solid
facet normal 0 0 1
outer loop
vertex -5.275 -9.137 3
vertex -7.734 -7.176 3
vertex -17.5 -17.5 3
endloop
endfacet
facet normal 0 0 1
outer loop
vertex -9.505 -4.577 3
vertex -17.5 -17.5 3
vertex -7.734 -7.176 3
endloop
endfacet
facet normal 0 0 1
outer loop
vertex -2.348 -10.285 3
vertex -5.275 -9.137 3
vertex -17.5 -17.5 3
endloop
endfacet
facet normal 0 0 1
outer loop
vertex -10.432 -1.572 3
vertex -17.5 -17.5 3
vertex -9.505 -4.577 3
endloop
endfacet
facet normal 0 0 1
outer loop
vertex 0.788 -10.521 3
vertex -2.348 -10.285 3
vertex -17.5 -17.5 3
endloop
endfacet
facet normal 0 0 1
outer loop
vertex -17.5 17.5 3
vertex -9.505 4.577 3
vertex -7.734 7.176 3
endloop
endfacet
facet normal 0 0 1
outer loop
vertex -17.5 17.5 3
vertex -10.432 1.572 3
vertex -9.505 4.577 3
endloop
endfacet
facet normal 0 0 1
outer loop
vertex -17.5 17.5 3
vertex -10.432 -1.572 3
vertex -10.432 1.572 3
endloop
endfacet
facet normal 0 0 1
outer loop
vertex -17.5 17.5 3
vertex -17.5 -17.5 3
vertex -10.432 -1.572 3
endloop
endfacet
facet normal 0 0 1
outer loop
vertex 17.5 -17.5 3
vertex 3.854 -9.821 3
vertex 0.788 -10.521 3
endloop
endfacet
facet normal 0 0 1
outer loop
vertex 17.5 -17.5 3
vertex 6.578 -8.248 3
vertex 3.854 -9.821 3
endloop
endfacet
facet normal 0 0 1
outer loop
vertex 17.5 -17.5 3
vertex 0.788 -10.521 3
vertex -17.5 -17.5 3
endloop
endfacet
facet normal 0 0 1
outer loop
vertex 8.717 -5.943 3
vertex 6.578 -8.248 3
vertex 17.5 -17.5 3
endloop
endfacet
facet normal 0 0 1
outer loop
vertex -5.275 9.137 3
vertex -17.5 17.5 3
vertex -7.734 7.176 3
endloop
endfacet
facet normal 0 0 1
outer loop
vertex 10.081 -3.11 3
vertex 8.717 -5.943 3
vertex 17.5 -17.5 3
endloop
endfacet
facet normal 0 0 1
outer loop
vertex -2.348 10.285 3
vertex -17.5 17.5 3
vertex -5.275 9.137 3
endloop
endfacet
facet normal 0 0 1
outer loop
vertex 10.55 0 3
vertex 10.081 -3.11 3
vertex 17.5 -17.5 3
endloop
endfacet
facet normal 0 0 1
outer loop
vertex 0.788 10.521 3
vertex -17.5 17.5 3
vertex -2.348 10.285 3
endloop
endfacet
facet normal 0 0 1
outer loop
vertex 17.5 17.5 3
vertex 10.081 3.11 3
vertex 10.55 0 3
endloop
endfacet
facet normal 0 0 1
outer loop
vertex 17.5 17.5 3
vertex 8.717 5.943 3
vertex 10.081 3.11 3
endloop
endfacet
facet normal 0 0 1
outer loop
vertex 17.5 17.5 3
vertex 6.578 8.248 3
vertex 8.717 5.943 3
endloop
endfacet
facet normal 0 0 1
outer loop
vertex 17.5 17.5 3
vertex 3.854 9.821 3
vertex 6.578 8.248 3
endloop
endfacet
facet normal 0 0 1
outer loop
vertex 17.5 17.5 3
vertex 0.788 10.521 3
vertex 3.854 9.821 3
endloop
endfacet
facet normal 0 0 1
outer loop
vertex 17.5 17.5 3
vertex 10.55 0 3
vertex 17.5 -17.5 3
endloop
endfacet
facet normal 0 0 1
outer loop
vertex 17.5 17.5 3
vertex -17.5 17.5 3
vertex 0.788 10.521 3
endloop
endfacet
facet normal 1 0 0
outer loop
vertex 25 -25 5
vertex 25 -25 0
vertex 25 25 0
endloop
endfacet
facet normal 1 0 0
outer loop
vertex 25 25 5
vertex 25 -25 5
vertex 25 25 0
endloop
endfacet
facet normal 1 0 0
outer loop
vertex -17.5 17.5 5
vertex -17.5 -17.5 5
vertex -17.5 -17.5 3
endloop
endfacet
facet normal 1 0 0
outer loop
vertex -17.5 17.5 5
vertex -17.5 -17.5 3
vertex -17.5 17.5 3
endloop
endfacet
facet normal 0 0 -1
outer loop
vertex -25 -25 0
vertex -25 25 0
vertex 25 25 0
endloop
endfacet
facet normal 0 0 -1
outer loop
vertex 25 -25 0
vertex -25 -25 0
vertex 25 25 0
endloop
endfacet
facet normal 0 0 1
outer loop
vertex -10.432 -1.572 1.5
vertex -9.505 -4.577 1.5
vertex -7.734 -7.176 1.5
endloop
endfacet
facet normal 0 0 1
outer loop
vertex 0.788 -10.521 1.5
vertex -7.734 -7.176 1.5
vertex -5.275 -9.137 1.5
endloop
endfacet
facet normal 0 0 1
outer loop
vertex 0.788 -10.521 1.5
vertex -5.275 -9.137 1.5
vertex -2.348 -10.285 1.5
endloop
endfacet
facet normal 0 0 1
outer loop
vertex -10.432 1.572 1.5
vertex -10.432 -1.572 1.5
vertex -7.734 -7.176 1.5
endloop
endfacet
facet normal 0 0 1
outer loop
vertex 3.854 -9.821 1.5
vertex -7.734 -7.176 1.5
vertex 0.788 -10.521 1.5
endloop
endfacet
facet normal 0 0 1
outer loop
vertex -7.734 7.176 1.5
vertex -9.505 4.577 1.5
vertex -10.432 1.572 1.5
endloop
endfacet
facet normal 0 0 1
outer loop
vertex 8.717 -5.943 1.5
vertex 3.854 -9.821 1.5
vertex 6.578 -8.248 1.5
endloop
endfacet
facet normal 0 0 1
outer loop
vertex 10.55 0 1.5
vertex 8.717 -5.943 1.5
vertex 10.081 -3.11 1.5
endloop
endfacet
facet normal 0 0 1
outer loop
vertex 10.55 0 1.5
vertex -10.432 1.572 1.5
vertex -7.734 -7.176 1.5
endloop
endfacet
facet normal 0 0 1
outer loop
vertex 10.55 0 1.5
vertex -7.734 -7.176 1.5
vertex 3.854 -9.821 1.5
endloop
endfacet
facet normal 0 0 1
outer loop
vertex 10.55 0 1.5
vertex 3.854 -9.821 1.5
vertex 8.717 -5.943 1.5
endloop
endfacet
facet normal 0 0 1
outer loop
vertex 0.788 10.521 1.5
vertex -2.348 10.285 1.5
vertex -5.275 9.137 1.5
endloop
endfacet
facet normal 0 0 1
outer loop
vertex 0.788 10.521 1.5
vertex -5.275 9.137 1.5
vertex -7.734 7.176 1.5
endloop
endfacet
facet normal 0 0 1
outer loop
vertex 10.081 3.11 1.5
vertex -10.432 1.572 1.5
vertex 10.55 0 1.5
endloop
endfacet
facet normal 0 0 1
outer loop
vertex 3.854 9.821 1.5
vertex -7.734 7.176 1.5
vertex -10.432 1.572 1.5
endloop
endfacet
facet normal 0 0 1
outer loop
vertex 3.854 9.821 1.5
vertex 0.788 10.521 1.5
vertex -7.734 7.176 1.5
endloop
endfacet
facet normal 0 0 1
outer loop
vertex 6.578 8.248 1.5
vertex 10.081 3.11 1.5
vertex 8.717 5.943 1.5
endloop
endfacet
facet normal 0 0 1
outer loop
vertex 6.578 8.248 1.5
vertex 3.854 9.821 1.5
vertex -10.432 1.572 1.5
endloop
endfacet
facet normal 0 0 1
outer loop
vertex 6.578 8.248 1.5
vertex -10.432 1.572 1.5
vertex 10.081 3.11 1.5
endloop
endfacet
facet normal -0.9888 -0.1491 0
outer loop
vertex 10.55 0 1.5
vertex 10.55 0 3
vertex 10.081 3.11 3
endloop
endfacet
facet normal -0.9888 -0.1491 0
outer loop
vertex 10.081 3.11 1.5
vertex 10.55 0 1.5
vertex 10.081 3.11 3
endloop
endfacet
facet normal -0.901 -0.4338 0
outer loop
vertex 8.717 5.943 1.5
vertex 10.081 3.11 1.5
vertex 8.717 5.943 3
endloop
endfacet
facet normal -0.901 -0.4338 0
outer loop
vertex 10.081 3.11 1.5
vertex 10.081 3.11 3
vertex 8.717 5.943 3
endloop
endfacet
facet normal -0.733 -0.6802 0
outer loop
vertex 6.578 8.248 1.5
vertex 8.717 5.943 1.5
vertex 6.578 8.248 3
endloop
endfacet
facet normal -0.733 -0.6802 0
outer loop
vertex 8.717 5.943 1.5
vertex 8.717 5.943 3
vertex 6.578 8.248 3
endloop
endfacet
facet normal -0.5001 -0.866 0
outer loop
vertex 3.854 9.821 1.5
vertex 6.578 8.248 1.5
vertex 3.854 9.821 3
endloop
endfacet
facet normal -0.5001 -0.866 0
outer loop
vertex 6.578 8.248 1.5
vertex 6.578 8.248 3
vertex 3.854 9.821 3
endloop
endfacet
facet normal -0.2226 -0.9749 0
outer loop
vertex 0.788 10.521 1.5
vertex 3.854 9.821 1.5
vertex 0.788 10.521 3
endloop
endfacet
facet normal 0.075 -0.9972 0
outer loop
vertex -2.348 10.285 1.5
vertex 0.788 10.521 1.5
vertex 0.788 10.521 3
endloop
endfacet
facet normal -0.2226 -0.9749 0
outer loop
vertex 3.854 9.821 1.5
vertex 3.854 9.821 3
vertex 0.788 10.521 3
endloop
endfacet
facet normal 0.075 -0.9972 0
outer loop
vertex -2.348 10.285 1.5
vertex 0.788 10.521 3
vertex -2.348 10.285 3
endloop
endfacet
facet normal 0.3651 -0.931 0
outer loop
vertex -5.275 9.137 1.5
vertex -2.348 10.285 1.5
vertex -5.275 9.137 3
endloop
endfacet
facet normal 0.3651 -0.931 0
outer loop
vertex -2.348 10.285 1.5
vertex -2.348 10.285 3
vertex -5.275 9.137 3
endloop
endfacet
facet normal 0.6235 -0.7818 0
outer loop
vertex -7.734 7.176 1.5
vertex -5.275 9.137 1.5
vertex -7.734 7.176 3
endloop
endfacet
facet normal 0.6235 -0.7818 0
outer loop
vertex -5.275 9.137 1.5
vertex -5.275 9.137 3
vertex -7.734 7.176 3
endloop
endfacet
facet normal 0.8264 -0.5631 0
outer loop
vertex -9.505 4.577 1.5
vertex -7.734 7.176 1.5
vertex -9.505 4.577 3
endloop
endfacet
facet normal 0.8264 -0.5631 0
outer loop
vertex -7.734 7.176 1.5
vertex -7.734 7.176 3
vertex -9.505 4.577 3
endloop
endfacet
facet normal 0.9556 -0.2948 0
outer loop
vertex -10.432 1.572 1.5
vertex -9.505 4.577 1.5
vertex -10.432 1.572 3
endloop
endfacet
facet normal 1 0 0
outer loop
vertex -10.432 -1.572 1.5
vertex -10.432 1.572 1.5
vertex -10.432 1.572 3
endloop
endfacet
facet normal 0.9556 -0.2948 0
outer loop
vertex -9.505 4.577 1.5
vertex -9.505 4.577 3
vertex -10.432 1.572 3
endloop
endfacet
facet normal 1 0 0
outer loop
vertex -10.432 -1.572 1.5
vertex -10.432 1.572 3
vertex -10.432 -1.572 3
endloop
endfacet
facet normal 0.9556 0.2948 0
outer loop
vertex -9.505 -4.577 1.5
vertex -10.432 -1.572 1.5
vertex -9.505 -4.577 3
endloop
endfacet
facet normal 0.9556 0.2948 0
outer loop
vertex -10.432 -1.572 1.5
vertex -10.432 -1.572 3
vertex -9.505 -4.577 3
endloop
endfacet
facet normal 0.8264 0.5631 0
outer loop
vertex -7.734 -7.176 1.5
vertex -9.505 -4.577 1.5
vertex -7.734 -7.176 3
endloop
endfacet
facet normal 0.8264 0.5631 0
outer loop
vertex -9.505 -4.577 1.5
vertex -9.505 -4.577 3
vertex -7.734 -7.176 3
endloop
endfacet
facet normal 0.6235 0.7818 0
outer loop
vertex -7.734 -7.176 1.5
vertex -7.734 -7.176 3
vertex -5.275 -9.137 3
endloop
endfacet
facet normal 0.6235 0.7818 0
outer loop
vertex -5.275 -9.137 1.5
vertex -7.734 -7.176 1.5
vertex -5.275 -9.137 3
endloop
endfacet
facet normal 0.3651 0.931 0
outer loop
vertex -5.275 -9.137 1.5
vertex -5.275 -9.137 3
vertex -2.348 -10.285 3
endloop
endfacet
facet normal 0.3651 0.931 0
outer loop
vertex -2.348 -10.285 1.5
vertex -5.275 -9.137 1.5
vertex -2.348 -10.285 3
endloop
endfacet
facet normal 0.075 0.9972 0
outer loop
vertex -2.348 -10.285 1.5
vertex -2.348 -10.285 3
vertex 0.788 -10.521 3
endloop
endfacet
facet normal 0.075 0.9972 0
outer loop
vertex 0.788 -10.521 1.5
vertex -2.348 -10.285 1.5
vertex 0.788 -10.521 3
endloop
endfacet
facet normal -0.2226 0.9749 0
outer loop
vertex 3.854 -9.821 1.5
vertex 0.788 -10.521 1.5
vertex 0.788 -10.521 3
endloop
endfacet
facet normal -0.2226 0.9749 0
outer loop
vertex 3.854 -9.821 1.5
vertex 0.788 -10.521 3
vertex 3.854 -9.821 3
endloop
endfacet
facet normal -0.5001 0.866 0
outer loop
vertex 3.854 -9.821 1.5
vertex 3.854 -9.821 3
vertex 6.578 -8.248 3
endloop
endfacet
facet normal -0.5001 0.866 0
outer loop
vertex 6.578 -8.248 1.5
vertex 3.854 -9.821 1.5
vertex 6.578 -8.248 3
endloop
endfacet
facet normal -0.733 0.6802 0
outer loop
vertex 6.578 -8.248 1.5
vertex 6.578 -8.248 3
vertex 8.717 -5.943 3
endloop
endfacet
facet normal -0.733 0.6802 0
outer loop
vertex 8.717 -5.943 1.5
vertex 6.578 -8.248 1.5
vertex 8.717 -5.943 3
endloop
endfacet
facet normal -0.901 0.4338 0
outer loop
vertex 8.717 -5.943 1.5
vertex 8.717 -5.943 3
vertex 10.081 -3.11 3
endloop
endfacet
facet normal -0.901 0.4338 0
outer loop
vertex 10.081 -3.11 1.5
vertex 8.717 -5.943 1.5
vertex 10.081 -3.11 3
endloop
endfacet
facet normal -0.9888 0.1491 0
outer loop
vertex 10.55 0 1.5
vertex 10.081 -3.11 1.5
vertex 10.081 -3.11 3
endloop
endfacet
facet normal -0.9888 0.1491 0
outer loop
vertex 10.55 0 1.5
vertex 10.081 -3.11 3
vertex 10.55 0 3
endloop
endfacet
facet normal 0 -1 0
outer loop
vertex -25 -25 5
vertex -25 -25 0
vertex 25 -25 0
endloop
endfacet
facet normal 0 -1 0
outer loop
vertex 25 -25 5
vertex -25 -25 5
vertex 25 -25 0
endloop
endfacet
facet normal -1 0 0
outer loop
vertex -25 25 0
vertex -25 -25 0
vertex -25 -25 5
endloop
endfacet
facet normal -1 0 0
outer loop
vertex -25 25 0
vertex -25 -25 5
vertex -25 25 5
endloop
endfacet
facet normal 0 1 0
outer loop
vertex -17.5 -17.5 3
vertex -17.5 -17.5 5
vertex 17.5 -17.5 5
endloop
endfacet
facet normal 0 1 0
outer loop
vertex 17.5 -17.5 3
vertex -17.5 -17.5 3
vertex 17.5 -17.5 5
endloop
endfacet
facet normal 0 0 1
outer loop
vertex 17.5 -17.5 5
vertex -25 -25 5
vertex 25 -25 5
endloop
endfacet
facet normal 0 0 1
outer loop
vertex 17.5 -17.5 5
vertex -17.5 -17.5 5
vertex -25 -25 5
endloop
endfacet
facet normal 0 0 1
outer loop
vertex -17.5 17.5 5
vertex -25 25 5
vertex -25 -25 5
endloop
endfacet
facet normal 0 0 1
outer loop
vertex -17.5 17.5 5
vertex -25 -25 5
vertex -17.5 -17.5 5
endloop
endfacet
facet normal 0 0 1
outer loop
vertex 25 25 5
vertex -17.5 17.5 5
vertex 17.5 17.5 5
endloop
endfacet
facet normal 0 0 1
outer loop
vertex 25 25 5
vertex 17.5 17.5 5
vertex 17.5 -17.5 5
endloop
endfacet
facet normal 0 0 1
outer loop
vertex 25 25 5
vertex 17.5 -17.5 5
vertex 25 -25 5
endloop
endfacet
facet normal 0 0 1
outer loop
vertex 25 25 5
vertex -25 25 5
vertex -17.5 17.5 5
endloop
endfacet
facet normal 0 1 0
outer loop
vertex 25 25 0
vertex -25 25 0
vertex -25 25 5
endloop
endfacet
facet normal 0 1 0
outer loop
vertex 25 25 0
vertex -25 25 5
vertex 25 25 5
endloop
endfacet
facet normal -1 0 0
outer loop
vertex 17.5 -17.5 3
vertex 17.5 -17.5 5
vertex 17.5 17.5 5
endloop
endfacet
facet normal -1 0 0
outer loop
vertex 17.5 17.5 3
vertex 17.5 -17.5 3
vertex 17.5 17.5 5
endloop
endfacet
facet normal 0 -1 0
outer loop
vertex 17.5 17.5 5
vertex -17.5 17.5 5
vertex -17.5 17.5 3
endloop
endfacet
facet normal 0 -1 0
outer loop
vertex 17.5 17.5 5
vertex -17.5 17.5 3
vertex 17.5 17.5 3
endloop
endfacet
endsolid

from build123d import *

# Parameters (mm, degrees)
F0_W     = 50
F0_H     = 50
F0_W_2   = 35
F0_H_2   = 35
F0_R     = 10.55
F1_DEPTH = 5
F2_W     = 35
F2_H     = 35
F2_R     = 10.55
F3_DEPTH = 2
F4_DEPTH = 3.5


with BuildPart() as f1:
    # F0 (on Top) → F1 (new body)
    with BuildSketch(Plane.XY):
        Rectangle(F0_W, F0_H)
        Rectangle(F0_W_2, F0_H_2, mode=Mode.SUBTRACT)
        Rectangle(F0_W_2, F0_H_2)
        Circle(F0_R, mode=Mode.SUBTRACT)
        Circle(F0_R)
    extrude(amount=F1_DEPTH)

    # F2 (on face) → F3 (cut)
    with BuildSketch(Plane.XY.offset(5)):
        Rectangle(F2_W, F2_H)
        Circle(F2_R, mode=Mode.SUBTRACT)
        Circle(F2_R)
    extrude(amount=-F3_DEPTH, mode=Mode.SUBTRACT)

    # F2 (on face) → F4 (cut)
    with BuildSketch(Plane.XY.offset(5)):
        Circle(F2_R)
    extrude(amount=-F4_DEPTH, mode=Mode.SUBTRACT)


solid = f1.part
